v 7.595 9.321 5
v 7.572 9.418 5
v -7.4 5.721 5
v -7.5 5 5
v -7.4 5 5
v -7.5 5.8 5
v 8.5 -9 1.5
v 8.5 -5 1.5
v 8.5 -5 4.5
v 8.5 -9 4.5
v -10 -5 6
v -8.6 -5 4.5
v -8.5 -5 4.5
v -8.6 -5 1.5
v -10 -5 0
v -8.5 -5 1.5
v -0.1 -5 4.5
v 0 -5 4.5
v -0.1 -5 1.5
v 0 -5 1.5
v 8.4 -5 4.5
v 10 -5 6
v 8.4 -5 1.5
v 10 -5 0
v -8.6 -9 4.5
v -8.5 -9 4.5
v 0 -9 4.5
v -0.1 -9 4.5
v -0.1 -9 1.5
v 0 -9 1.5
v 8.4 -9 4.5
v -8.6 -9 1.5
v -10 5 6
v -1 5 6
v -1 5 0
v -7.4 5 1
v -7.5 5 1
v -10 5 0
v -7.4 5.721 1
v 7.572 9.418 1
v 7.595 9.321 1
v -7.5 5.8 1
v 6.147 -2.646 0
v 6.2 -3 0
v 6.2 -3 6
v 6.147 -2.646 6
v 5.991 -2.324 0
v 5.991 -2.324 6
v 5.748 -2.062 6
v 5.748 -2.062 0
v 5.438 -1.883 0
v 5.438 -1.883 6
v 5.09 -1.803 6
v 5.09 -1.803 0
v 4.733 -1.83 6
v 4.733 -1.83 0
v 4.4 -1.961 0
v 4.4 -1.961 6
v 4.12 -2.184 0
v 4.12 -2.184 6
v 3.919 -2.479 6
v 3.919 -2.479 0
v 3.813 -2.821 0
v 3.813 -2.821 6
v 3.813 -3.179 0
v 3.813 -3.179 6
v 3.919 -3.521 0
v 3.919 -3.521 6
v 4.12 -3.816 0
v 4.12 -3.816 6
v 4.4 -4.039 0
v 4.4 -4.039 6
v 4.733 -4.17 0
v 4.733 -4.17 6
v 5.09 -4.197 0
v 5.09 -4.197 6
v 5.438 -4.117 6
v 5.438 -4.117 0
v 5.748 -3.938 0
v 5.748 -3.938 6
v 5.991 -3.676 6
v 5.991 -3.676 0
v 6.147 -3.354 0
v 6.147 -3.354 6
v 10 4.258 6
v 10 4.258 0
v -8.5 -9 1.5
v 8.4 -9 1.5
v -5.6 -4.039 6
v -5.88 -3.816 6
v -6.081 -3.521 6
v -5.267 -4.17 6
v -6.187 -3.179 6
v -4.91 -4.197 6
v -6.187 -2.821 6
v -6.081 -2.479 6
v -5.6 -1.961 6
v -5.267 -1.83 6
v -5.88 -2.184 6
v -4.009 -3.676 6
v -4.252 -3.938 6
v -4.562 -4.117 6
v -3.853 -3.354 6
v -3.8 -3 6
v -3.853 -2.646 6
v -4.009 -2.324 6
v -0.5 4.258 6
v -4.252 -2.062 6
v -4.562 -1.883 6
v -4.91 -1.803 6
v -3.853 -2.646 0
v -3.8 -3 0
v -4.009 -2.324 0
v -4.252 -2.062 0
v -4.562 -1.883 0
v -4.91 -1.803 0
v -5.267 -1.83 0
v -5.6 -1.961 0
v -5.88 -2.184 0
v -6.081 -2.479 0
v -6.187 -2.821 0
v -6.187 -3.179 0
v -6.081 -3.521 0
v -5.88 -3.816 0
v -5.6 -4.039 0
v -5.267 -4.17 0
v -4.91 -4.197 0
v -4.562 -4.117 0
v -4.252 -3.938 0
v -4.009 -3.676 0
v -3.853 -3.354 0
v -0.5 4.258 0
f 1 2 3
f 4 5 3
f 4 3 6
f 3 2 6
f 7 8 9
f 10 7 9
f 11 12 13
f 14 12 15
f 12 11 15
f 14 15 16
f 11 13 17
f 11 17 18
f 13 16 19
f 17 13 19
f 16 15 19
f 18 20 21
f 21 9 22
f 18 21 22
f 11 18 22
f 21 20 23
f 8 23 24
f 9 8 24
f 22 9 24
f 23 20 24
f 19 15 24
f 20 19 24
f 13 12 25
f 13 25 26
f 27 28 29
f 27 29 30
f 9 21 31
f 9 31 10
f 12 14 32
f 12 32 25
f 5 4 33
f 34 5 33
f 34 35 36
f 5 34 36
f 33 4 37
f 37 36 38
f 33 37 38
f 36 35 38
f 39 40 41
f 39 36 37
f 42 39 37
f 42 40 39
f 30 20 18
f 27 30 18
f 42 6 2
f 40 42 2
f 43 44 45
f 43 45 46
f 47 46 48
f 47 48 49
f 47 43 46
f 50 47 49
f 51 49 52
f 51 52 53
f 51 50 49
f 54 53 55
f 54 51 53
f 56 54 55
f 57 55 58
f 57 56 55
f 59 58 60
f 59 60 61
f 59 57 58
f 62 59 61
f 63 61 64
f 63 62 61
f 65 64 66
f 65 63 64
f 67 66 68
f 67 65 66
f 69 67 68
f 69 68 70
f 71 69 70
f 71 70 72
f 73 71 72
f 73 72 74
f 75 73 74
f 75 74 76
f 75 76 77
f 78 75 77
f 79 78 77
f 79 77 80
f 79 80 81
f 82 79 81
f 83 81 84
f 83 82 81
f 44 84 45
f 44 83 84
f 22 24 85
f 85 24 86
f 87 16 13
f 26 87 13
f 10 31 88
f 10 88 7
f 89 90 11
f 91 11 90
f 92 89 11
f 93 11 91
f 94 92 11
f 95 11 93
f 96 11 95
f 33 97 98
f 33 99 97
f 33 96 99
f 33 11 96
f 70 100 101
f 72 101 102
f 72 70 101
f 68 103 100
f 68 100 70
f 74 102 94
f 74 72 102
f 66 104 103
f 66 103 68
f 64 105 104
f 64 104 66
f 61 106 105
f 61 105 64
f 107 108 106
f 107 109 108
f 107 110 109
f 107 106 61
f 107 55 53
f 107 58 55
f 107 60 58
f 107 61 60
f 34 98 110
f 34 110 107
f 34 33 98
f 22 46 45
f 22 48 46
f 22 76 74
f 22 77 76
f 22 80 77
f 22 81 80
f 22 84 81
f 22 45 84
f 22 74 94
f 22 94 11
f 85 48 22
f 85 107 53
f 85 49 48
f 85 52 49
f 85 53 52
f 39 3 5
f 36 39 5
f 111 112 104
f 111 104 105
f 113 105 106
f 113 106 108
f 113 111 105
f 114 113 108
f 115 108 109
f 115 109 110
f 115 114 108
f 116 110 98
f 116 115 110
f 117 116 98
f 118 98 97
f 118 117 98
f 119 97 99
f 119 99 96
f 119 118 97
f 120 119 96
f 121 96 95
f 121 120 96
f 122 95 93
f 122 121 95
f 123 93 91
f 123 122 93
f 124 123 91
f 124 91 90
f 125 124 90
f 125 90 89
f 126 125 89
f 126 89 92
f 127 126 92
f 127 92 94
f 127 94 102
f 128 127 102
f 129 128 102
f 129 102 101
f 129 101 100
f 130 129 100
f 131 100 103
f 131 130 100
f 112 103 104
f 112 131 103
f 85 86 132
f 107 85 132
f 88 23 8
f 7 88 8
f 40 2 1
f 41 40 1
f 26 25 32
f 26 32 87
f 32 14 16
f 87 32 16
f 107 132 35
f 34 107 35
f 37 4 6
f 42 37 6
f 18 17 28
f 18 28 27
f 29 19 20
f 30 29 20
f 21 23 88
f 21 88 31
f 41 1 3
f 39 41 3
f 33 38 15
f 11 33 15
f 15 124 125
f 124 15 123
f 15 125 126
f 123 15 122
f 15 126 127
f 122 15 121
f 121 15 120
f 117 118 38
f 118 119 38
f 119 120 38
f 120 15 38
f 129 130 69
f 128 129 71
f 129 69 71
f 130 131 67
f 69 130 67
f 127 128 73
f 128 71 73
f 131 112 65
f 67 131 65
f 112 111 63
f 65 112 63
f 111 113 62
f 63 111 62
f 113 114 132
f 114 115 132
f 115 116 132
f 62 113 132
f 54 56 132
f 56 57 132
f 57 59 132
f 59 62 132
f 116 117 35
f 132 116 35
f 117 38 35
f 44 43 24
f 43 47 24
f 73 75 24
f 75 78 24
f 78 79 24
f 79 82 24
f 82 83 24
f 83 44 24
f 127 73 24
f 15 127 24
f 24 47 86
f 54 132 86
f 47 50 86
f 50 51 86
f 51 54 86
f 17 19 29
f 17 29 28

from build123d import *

# Parameters (mm, degrees)
SKETCH1_R           = 1.2
BOSS_EXTRUDE1_DEPTH = 6
EXTRUDE_THIN1_START = -1
EXTRUDE_THIN1_DEPTH = 4
SKETCH3_W           = 0.1
SKETCH3_H           = 3
EXTRUDE_THIN2_DEPTH = 4


with BuildPart() as part:
    # Sketch1 → Boss-Extrude1 (new body)
    with BuildSketch(Plane.XY):
        Polygon((-0.5, 4.258314247), (-1, 5), (-10, 5), (-10, -5), (10, -5), (10, 4.258314247), align=None)
        with Locations((-5, -3)):
            Circle(SKETCH1_R, mode=Mode.SUBTRACT)
        with Locations((5, -3)):
            Circle(SKETCH1_R, mode=Mode.SUBTRACT)
    extrude(amount=BOSS_EXTRUDE1_DEPTH)

    # Sketch2 → Extrude-Thin1 (add)
    with BuildSketch(Plane.XY.offset(6).offset(EXTRUDE_THIN1_START)):
        Polygon((-7.5, 5), (-7.5, 5.8), (7.571733766, 9.41840314), (7.595078303, 9.321166148), (-7.4, 5.721166357), (-7.4, 5), align=None)
    extrude(amount=-EXTRUDE_THIN1_DEPTH)

    # Sketch3 → Extrude-Thin2 (add)
    with BuildSketch(Plane.XZ.offset(5)):
        with Locations((-8.55, 3)):
            Rectangle(SKETCH3_W, SKETCH3_H)
        with Locations((8.45, 3)):
            Rectangle(SKETCH3_W, SKETCH3_H)
        with Locations((-0.05, 3)):
            Rectangle(SKETCH3_W, SKETCH3_H)
    extrude(amount=EXTRUDE_THIN2_DEPTH)


solid = part.part
